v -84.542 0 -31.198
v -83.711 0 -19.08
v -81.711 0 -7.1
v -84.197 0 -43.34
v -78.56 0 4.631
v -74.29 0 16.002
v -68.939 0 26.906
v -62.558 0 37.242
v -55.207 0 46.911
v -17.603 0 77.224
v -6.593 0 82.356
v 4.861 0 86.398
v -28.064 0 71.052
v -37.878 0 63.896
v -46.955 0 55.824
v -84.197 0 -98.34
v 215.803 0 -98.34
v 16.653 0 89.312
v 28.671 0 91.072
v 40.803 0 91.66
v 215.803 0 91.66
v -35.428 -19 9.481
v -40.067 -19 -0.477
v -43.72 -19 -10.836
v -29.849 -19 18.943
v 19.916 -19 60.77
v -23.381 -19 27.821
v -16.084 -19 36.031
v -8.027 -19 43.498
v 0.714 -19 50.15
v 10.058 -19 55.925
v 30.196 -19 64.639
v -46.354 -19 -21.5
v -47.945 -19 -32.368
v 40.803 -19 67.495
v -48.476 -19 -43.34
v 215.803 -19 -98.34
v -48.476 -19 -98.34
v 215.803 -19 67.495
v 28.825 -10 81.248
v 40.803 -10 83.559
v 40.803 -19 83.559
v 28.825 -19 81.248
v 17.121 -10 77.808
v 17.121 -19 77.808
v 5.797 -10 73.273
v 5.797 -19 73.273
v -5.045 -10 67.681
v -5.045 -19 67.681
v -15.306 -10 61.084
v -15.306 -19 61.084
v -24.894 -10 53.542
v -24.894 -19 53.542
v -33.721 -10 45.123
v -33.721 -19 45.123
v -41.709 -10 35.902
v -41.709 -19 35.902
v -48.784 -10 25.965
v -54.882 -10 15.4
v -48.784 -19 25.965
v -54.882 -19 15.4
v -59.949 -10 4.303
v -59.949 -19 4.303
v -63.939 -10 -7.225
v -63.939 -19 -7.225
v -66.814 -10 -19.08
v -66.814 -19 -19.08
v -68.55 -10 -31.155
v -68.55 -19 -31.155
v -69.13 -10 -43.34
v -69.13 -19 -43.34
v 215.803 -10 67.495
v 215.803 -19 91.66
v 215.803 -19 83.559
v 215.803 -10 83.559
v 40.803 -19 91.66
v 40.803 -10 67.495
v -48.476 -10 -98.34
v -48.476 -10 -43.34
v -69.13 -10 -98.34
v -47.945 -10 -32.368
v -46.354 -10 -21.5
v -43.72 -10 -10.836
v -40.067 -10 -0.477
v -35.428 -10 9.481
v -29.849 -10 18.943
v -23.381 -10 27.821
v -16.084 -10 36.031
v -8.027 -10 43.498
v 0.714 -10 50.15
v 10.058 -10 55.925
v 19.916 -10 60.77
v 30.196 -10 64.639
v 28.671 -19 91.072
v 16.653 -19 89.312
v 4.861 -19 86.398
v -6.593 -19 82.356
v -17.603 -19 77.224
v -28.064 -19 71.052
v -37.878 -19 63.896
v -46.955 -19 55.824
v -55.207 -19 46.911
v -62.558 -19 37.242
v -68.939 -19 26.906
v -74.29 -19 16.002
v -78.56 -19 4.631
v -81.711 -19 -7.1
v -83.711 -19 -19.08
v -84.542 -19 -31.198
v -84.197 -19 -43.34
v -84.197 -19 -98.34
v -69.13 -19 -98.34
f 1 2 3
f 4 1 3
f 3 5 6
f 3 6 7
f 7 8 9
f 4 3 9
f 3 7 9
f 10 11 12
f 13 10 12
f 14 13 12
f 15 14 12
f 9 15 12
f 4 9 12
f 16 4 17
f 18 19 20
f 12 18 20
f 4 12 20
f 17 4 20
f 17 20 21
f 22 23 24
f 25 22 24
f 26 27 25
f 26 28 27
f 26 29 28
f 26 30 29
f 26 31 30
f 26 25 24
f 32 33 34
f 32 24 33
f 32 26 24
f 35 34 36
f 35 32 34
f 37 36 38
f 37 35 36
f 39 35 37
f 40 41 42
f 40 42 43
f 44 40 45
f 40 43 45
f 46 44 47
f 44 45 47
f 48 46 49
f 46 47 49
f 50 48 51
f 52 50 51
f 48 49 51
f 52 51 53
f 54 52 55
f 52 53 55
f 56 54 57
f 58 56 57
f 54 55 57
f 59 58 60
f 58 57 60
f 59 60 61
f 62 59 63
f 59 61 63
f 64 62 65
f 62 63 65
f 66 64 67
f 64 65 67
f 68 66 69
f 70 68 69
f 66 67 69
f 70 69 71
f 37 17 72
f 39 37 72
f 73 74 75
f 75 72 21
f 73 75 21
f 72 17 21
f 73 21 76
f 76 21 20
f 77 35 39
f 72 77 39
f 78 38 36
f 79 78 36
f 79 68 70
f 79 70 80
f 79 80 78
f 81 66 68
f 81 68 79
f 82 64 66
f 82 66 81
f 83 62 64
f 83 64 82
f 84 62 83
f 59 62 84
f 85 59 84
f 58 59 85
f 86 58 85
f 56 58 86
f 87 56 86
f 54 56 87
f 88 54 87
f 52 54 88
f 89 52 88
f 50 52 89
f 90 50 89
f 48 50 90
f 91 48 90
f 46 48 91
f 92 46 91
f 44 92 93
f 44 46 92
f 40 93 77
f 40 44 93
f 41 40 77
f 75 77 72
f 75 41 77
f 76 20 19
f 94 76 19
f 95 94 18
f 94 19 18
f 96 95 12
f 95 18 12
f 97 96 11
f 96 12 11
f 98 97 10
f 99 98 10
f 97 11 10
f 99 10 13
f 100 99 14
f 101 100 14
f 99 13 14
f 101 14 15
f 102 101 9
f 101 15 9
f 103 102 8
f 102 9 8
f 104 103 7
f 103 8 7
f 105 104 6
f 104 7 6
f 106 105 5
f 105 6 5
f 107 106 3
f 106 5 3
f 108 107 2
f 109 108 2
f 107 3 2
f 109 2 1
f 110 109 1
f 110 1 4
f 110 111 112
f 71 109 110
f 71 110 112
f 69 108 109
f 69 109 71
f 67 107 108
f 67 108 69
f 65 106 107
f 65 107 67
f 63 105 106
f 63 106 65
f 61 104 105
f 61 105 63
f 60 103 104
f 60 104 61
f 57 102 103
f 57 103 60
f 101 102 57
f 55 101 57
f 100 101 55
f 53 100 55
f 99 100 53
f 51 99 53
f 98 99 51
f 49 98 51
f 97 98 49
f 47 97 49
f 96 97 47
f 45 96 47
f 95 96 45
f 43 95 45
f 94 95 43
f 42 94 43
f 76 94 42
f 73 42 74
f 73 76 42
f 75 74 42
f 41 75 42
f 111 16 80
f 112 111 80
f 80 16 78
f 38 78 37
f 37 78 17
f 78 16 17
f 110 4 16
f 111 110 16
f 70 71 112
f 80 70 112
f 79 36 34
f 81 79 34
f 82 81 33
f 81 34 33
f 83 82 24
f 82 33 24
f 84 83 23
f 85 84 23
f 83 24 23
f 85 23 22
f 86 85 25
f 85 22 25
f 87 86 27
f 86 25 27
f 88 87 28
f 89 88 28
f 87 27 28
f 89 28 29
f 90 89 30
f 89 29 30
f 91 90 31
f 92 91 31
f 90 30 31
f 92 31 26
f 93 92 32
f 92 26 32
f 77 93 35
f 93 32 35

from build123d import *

# Parameters (mm, degrees)
F1_DEPTH = 19
F3_DEPTH = 9


with BuildPart() as f1:
    # F0 (on Front) → F1 (new body)
    with BuildSketch(Plane.XZ):
        with BuildLine():
            Line((215.803112, -98.339818), (215.803112, 91.660182))
            Line((215.803112, 91.660182), (40.803112, 91.660182))
            ThreePointArc((40.803112, 91.660182), (-51.188735, 51.467448), (-84.196888, -43.339818))
            Line((-84.196888, -43.339818), (-84.196888, -98.339818))
            Line((-84.196888, -98.339818), (215.803112, -98.339818))
        make_face()
    extrude(amount=F1_DEPTH)

    # F2 (on face) → F3 (cut)
    with BuildSketch(Plane.XZ.offset(19)):
        with BuildLine():
            Line((-48.476428, -98.339818), (-48.476428, -43.339818))
            ThreePointArc((-48.476428, -43.339818), (-23.380529, 27.820504), (40.803112, 67.494877))
            Line((40.803112, 67.494877), (215.803112, 67.494877))
            Line((215.803112, 67.494877), (215.803112, 83.558917))
            Line((215.803112, 83.558917), (40.803112, 83.558917))
            ThreePointArc((40.803112, 83.558917), (-37.824855, 40.607519), (-69.130197, -43.339818))
            Line((-69.130197, -43.339818), (-69.130197, -98.339818))
            Line((-69.130197, -98.339818), (-48.476428, -98.339818))
        make_face()
    extrude(amount=-F3_DEPTH, mode=Mode.SUBTRACT)


solid = f1.part
